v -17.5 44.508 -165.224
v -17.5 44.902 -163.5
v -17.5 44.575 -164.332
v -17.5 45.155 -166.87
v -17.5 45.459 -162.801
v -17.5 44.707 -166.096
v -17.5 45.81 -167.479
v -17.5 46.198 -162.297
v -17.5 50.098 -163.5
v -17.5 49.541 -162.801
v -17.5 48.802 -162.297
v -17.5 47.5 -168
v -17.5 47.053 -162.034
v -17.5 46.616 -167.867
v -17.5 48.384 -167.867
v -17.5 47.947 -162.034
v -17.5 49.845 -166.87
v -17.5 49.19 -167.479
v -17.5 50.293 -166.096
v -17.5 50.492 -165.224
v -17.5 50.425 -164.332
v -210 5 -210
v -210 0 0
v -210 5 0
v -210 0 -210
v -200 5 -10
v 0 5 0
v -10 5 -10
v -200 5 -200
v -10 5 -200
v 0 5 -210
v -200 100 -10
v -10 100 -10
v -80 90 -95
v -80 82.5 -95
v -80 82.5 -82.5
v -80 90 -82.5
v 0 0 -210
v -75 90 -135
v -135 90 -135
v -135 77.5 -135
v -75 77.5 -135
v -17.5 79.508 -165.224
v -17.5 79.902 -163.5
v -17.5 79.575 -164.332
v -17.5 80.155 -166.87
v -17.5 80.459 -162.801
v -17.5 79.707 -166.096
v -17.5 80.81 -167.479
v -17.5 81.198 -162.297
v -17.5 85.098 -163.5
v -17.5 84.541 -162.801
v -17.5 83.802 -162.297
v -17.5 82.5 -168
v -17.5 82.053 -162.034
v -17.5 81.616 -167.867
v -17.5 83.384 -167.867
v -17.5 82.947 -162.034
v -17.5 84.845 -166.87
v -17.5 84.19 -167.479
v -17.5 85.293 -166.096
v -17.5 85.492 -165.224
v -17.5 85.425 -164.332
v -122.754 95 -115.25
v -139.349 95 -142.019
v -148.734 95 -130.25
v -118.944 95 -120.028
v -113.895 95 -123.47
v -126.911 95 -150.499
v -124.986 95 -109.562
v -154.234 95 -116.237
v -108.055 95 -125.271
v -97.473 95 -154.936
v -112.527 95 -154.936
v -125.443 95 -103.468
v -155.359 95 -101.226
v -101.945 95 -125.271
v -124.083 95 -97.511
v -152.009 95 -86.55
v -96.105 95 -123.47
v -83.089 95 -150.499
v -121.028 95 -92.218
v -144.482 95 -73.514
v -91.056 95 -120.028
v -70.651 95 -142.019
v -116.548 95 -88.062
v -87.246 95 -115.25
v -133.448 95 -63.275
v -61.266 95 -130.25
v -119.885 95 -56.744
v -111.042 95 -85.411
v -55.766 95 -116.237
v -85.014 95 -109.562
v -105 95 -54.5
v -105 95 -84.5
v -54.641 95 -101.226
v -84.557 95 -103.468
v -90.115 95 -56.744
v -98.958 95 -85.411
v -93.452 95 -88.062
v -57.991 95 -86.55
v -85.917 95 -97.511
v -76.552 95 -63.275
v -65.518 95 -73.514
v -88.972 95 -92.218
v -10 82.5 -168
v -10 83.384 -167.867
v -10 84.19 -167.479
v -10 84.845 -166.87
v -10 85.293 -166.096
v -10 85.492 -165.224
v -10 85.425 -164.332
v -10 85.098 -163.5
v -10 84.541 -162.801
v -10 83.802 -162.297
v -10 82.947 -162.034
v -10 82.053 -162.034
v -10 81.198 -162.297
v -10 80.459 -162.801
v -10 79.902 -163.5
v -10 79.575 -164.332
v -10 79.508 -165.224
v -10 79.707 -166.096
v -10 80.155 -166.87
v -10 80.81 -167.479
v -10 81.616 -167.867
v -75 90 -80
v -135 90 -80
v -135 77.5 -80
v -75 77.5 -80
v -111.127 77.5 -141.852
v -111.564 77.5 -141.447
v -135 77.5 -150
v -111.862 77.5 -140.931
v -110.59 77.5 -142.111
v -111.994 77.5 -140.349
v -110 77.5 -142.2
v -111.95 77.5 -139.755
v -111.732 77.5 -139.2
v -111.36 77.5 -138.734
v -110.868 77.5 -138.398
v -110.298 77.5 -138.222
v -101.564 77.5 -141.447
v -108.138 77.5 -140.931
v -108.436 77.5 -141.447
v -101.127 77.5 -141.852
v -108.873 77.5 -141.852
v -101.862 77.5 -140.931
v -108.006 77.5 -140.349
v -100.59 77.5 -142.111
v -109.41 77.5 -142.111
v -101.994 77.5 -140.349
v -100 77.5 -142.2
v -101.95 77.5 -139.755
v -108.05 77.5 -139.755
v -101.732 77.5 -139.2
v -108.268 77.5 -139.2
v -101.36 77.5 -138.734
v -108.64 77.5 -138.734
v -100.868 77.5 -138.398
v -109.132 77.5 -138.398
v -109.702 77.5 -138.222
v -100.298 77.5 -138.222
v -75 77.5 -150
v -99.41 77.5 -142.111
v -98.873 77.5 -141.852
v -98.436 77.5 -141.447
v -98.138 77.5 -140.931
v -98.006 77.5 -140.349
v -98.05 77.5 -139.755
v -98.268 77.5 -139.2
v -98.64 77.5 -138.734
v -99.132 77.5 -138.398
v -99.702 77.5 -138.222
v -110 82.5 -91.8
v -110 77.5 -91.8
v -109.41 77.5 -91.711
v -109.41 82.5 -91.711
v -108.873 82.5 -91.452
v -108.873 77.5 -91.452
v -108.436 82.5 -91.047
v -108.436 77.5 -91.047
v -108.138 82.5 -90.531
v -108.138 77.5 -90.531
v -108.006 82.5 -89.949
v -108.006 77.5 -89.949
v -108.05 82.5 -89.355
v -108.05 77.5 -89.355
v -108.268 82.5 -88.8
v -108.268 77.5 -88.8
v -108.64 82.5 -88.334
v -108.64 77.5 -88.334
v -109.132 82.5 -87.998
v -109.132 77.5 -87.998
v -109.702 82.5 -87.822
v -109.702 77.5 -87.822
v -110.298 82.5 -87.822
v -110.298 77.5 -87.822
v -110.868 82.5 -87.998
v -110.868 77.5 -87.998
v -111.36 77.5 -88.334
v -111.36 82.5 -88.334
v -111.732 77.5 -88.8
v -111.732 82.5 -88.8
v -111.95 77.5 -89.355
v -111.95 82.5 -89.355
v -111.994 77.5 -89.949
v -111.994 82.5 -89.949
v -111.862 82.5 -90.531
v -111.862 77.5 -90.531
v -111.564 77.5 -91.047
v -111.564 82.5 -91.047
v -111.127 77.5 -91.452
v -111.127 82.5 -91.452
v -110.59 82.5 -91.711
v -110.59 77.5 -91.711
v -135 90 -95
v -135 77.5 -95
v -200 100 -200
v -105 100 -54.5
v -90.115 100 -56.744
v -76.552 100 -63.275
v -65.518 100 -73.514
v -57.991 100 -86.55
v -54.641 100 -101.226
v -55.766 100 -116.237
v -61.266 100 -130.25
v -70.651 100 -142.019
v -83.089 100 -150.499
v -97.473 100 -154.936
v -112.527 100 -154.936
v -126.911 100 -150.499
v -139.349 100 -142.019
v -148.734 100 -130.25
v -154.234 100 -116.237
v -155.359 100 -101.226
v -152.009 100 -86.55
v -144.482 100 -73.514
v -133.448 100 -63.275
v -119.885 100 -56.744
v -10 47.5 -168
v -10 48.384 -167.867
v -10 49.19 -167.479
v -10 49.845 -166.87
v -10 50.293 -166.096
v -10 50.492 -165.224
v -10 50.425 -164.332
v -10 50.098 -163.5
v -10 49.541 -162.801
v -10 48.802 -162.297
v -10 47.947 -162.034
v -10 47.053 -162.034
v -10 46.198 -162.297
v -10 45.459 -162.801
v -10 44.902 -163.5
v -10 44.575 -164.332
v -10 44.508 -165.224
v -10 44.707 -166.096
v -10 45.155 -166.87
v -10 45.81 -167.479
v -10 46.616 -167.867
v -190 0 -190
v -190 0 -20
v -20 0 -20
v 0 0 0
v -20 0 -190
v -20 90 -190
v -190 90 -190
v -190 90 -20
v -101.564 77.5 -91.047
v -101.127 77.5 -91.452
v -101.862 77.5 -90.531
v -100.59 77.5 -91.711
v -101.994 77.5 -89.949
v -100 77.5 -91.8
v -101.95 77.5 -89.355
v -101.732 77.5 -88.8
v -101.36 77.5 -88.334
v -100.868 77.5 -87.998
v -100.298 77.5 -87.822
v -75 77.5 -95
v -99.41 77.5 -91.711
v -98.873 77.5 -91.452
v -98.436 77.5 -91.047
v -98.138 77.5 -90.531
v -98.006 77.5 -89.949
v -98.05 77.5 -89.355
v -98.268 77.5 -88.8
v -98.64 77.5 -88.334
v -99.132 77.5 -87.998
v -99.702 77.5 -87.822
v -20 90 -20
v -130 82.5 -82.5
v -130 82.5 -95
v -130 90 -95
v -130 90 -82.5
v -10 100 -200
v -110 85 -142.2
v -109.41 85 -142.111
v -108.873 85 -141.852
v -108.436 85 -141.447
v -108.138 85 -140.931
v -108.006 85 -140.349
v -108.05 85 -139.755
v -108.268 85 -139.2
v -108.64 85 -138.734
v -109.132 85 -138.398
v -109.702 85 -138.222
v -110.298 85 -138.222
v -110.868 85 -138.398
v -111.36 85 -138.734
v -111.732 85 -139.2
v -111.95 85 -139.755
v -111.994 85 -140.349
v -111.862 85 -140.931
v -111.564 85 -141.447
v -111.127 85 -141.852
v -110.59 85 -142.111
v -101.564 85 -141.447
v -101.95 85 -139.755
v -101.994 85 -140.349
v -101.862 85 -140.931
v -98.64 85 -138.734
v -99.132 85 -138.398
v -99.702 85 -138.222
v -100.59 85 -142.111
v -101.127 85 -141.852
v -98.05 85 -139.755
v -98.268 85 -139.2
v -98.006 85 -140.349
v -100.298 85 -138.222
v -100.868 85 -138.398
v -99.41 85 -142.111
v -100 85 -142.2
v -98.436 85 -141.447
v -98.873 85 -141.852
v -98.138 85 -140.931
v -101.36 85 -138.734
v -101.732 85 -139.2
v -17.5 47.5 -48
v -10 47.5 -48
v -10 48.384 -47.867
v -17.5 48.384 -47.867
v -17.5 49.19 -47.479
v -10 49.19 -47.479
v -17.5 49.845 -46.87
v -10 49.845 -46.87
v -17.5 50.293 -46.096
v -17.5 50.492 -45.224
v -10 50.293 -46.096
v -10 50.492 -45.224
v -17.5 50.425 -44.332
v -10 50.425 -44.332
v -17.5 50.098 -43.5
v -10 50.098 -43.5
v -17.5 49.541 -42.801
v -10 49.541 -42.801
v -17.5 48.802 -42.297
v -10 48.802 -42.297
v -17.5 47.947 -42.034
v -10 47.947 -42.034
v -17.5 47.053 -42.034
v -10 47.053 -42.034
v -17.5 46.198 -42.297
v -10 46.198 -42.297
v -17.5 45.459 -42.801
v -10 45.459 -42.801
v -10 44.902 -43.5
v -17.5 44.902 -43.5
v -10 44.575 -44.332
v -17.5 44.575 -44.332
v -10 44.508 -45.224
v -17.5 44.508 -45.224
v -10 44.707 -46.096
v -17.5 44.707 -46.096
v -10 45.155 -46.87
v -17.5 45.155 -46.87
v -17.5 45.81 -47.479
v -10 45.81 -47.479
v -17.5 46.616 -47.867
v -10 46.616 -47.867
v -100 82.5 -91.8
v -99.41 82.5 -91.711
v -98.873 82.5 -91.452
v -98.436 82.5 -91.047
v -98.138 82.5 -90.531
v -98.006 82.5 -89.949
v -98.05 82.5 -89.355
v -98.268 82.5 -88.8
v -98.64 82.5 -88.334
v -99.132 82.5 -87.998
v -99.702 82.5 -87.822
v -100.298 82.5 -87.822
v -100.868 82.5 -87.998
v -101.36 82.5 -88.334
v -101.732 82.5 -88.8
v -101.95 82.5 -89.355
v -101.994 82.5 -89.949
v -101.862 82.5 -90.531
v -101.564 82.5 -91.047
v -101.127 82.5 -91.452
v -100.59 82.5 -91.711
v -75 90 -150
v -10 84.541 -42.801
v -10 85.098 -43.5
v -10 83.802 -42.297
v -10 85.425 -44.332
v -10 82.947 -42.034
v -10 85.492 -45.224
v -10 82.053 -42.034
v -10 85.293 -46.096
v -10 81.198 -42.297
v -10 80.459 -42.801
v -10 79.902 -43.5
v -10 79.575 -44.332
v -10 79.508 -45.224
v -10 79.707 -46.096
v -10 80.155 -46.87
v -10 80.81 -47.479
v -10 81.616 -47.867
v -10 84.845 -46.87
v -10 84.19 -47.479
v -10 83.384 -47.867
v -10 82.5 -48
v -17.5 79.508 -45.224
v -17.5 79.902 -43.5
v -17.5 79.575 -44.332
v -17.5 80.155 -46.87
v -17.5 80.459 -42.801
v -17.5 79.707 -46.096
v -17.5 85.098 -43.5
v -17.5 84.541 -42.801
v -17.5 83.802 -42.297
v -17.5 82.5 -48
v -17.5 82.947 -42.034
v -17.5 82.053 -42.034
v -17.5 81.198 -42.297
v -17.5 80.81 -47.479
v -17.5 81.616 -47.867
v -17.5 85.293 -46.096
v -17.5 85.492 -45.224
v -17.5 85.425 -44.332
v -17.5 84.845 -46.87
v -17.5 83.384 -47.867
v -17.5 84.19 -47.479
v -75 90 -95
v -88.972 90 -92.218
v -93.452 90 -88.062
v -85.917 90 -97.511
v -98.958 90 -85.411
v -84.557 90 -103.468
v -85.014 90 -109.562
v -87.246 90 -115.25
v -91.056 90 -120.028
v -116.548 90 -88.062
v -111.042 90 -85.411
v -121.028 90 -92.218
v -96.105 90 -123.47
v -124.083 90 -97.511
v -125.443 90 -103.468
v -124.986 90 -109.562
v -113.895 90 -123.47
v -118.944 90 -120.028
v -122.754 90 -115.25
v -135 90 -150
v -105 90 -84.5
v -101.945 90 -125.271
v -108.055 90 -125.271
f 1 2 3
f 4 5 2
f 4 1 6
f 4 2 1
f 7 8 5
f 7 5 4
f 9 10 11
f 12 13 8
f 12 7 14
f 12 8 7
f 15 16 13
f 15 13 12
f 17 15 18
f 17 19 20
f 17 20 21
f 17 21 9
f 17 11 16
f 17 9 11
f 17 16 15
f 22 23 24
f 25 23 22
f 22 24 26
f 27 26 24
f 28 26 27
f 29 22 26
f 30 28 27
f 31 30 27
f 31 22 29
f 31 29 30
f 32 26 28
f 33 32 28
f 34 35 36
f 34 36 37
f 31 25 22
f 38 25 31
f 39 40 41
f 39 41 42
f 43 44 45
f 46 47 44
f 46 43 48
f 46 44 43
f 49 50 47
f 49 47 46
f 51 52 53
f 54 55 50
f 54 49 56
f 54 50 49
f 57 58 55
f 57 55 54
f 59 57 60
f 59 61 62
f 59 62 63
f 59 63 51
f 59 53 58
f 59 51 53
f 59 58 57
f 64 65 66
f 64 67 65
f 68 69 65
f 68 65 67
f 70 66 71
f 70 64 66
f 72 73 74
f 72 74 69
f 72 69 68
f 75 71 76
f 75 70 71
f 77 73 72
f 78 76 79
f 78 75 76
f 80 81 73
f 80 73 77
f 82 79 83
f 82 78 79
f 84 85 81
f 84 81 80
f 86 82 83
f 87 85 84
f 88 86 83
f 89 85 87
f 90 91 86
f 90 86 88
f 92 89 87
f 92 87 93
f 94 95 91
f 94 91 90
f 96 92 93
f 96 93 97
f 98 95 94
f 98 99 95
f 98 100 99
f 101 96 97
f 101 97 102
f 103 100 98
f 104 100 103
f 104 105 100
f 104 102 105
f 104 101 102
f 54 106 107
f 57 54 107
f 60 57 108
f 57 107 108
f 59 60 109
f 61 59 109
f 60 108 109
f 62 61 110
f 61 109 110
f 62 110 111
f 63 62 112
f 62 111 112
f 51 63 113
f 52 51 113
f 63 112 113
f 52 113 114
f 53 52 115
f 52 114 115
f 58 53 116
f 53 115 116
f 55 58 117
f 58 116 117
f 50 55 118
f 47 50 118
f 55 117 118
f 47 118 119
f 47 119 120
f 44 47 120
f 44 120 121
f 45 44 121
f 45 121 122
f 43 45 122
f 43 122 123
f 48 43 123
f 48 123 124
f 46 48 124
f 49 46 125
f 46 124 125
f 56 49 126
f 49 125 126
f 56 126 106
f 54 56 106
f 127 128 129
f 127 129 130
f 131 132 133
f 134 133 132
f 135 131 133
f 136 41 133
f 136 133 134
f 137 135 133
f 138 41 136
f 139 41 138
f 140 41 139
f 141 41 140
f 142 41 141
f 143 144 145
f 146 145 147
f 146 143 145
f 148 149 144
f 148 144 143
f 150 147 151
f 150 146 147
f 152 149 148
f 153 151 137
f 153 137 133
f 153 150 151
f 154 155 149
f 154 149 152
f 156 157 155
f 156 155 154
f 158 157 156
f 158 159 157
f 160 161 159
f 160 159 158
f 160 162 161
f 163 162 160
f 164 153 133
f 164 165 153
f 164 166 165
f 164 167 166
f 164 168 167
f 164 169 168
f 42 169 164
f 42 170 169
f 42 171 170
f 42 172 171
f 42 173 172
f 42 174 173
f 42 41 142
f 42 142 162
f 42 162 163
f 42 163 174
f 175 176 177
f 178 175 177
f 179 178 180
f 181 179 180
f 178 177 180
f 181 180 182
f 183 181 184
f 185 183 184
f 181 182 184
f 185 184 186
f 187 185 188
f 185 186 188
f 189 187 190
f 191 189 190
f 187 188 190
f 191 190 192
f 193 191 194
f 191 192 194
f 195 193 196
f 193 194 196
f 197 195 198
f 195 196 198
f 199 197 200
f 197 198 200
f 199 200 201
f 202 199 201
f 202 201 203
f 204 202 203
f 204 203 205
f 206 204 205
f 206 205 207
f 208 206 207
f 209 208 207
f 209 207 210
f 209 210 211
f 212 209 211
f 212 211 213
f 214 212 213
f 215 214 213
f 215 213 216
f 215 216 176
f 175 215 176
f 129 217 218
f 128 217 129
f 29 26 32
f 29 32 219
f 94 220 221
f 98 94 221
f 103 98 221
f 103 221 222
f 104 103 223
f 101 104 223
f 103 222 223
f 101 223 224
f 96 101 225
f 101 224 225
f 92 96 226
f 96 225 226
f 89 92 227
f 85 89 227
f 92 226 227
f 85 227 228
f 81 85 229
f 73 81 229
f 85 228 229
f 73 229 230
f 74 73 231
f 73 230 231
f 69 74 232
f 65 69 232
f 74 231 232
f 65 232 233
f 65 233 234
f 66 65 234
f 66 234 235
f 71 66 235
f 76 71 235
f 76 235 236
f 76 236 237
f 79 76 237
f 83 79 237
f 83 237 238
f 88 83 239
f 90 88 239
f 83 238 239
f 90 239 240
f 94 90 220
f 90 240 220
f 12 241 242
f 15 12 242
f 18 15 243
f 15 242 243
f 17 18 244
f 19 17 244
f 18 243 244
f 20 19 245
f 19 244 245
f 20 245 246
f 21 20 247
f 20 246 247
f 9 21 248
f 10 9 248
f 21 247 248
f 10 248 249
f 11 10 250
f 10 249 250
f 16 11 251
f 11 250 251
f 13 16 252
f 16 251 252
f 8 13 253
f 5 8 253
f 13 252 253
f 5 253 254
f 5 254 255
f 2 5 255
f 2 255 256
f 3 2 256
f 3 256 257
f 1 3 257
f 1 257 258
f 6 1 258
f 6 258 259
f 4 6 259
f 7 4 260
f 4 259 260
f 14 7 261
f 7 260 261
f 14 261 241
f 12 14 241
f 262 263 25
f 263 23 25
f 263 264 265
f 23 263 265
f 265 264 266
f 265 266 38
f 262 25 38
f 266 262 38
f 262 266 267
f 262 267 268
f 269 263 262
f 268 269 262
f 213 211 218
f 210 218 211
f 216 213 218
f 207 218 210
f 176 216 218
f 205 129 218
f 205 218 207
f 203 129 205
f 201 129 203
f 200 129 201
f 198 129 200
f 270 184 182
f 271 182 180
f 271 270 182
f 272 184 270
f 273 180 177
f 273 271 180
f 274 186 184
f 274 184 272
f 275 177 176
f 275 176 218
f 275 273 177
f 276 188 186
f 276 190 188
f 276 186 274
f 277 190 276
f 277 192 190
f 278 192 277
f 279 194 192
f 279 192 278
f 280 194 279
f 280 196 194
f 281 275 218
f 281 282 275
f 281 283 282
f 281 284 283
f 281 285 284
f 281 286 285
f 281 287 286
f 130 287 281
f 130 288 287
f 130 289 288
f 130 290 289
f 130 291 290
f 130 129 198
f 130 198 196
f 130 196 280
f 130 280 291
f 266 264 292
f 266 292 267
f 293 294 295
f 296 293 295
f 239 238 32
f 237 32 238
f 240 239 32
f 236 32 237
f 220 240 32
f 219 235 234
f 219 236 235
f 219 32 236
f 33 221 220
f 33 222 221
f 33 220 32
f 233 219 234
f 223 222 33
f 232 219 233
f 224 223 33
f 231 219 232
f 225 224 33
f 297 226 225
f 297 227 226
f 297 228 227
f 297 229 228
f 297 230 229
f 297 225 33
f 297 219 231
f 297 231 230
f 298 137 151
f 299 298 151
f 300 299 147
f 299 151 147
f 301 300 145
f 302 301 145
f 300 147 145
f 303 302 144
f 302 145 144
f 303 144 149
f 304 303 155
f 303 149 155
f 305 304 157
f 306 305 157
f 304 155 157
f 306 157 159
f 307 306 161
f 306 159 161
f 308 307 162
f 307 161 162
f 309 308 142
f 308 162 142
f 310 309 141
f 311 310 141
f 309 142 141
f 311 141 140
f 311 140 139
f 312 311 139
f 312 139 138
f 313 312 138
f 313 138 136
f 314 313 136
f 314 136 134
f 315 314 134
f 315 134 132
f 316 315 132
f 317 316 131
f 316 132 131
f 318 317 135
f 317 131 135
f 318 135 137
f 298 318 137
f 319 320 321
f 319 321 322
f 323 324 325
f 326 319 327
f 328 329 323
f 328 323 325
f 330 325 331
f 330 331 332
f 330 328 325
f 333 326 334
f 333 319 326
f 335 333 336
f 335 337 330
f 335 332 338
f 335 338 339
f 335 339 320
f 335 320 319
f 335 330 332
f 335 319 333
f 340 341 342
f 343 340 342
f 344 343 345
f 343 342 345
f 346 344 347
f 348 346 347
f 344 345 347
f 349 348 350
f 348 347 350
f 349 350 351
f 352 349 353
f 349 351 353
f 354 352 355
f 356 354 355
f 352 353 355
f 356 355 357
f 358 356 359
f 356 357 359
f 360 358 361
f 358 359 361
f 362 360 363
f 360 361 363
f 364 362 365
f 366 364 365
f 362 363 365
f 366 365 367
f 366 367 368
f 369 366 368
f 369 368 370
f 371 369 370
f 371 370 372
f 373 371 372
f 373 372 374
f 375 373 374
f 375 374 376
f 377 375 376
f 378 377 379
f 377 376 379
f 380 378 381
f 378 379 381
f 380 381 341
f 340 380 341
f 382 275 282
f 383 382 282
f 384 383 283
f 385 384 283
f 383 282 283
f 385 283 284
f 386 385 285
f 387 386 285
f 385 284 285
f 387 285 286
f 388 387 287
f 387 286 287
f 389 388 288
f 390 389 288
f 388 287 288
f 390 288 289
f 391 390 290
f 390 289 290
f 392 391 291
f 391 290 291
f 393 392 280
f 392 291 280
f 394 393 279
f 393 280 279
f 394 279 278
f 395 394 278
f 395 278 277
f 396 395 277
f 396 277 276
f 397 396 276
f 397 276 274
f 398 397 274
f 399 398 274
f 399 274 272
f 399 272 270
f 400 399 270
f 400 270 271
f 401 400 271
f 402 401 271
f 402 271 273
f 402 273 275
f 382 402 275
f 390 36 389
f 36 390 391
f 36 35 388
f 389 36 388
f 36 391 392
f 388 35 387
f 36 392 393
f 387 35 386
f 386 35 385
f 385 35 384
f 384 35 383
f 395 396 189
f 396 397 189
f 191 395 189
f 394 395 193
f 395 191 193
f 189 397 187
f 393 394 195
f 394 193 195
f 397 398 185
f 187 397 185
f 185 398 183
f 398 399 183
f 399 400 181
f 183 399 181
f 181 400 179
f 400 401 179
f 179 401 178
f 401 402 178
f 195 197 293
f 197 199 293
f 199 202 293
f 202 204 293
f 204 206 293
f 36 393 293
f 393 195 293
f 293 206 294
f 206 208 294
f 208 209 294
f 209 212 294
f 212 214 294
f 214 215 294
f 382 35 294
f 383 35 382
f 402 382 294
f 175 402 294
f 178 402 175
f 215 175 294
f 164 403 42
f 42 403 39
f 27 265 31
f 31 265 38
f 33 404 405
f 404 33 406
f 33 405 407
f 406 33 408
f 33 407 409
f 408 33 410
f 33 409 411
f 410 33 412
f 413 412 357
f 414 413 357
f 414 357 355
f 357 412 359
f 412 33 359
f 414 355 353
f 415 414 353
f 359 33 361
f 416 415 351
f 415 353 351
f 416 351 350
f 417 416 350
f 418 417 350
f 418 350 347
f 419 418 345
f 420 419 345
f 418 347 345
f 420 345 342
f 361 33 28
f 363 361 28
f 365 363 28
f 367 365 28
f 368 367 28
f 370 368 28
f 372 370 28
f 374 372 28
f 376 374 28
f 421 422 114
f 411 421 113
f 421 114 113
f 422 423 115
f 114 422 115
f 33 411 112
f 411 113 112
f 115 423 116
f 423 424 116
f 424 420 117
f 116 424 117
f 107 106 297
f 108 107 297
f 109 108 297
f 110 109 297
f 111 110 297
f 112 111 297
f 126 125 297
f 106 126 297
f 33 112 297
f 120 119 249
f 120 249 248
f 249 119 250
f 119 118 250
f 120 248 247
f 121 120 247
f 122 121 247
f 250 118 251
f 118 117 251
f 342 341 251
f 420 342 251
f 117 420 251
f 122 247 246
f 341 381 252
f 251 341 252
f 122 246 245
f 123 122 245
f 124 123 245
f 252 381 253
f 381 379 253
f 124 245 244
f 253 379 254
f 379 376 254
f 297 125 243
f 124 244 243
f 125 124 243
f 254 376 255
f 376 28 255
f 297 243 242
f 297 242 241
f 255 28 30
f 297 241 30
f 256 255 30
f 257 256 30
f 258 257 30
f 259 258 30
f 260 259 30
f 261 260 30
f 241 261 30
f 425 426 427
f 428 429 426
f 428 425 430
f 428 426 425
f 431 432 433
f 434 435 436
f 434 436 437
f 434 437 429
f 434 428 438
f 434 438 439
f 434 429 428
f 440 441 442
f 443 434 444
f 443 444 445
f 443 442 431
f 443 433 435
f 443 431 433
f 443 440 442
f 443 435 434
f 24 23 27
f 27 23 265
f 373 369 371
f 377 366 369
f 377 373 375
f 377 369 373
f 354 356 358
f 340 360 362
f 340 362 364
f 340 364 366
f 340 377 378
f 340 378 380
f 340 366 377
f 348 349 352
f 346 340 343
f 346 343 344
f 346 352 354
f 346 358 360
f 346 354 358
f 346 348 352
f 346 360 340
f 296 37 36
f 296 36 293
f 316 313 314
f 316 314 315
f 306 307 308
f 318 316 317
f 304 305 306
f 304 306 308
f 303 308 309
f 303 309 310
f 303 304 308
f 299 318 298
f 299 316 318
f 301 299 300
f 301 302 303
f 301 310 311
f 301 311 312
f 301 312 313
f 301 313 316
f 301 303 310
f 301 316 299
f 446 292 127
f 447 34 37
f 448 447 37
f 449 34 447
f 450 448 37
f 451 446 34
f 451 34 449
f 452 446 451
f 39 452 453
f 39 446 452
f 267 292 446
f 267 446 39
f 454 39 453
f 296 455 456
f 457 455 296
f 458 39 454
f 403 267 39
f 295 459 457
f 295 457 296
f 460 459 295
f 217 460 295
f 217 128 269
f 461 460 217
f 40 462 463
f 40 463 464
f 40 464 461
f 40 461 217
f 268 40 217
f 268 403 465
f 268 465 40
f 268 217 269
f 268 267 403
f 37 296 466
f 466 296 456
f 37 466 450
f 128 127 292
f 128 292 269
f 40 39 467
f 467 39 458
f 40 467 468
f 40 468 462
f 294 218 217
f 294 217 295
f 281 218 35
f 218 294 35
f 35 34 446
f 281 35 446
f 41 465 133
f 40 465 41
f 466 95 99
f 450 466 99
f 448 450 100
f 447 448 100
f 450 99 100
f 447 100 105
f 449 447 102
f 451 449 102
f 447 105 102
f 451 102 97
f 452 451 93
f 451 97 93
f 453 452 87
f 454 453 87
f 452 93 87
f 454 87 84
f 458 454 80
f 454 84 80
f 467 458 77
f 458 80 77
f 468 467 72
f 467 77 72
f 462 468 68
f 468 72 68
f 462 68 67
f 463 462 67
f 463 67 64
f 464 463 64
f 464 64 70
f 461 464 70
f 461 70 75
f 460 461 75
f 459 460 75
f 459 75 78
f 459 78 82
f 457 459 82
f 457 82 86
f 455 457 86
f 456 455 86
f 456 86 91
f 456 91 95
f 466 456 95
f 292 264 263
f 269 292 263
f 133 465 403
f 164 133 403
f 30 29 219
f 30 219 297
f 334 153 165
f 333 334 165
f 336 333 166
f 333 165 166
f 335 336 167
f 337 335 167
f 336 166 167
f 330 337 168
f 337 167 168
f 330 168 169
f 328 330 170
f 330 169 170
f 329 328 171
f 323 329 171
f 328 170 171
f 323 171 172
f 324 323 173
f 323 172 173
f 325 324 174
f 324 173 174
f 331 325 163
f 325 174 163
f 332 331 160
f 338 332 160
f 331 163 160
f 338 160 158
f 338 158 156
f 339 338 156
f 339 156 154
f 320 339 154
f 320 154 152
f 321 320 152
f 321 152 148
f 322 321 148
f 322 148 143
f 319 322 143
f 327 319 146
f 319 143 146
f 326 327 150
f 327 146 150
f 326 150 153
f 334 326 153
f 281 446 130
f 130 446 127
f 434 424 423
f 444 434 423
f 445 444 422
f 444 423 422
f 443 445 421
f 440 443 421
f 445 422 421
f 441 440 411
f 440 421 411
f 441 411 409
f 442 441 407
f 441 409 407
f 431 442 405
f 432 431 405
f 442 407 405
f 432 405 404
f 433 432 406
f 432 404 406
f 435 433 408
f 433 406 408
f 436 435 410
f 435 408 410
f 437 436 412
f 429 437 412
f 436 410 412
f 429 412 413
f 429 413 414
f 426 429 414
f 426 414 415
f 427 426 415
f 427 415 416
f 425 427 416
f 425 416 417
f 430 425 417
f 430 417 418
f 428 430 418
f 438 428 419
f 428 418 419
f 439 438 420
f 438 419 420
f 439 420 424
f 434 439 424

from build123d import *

# Parameters (mm, degrees)
SKETCH1_W           = 210
SKETCH1_H           = 210
BOSS_EXTRUDE1_DEPTH = 5
SKETCH2_W           = 190
SKETCH2_H           = 190
BOSS_EXTRUDE2_DEPTH = 95
SKETCH3_W           = 170
SKETCH3_H           = 170
CUT_EXTRUDE1_DEPTH  = 90
SKETCH4_R           = 50.5
CUT_EXTRUDE2_DEPTH  = 5
SKETCH5_R           = 20.5
CUT_EXTRUDE3_DEPTH  = 5
SKETCH6_W           = 60
SKETCH6_H           = 15
BOSS_EXTRUDE3_DEPTH = 12.5
SKETCH7_W           = 50
SKETCH7_H           = 7.5
CUT_EXTRUDE4_DEPTH  = 12.5
SKETCH8_R           = 2
CUT_EXTRUDE5_DEPTH  = 7.5
SKETCH9_R           = 3
CUT_EXTRUDE6_DEPTH  = 7.5


with BuildPart() as part:
    # Sketch1 → Boss-Extrude1 (new body)
    with BuildSketch(Plane(origin=(0, 0, 0), x_dir=(1, 0, 0), z_dir=(0, 1, 0))):
        with Locations((-105, 105)):
            Rectangle(SKETCH1_W, SKETCH1_H)
    extrude(amount=BOSS_EXTRUDE1_DEPTH)

    # Sketch2 → Boss-Extrude2 (add)
    with BuildSketch(Plane(origin=(0, 5, 0), x_dir=(1, 0, 0), z_dir=(0, 1, 0))):
        with Locations((-105, 105)):
            Rectangle(SKETCH2_W, SKETCH2_H)
    extrude(amount=BOSS_EXTRUDE2_DEPTH)

    # Sketch3 → Cut-Extrude1 (cut)
    with BuildSketch(Plane(origin=(0, 0, 0), x_dir=(-1, 0, 0), z_dir=(0, -1, 0))):
        with Locations((105, 105)):
            Rectangle(SKETCH3_W, SKETCH3_H)
    extrude(amount=-CUT_EXTRUDE1_DEPTH, mode=Mode.SUBTRACT)

    # Sketch4 → Cut-Extrude2 (cut)
    with BuildSketch(Plane(origin=(0, 100, 0), x_dir=(1, 0, 0), z_dir=(0, 1, 0))):
        with Locations(Location((-105, 105, 0), (0, 0, 270))):
            Circle(SKETCH4_R)
    extrude(amount=-CUT_EXTRUDE2_DEPTH, mode=Mode.SUBTRACT)

    # Sketch5 → Cut-Extrude3 (cut)
    with BuildSketch(Plane(origin=(0, 95, 0), x_dir=(1, 0, 0), z_dir=(0, 1, 0))):
        with Locations(Location((-105, 105, 0), (0, 0, 270))):
            Circle(SKETCH5_R)
    extrude(amount=-CUT_EXTRUDE3_DEPTH, mode=Mode.SUBTRACT)

    # Sketch6 → Boss-Extrude3 (add)
    with BuildSketch(Plane.XZ.offset(-90)):
        with Locations((-105, -87.5)):
            Rectangle(SKETCH6_W, SKETCH6_H)
        with Locations((-105, -142.5)):
            Rectangle(SKETCH6_W, SKETCH6_H)
    extrude(amount=BOSS_EXTRUDE3_DEPTH)

    # Sketch7 → Cut-Extrude4 (cut)
    with BuildSketch(Plane(origin=(0, 0, -95), x_dir=(-1, 0, 0), z_dir=(0, 0, -1))):
        with Locations((105, 86.25)):
            Rectangle(SKETCH7_W, SKETCH7_H)
    extrude(amount=-CUT_EXTRUDE4_DEPTH, mode=Mode.SUBTRACT)

    # Sketch8 → Cut-Extrude5 (cut)
    with BuildSketch(Plane.XZ.offset(-77.5)):
        with Locations(Location((-100, -89.8, 0), (0, 0, 270))):
            Circle(SKETCH8_R)
        with Locations(Location((-110, -89.8, 0), (0, 0, 270))):
            Circle(SKETCH8_R)
        with Locations(Location((-110, -140.2, 0), (0, 0, 270))):
            Circle(SKETCH8_R)
        with Locations(Location((-100, -140.2, 0), (0, 0, 270))):
            Circle(SKETCH8_R)
    extrude(amount=-CUT_EXTRUDE5_DEPTH, mode=Mode.SUBTRACT)

    # Sketch9 → Cut-Extrude6 (cut)
    with BuildSketch(Plane(origin=(-10, 0, 0), x_dir=(0, 0, -1), z_dir=(1, 0, 0))):
        with Locations((165, 47.5)):
            Circle(SKETCH9_R)
        with Locations((45, 47.5)):
            Circle(SKETCH9_R)
        with Locations((45, 82.5)):
            Circle(SKETCH9_R)
        with Locations((165, 82.5)):
            Circle(SKETCH9_R)
    extrude(amount=-CUT_EXTRUDE6_DEPTH, mode=Mode.SUBTRACT)


solid = part.part
